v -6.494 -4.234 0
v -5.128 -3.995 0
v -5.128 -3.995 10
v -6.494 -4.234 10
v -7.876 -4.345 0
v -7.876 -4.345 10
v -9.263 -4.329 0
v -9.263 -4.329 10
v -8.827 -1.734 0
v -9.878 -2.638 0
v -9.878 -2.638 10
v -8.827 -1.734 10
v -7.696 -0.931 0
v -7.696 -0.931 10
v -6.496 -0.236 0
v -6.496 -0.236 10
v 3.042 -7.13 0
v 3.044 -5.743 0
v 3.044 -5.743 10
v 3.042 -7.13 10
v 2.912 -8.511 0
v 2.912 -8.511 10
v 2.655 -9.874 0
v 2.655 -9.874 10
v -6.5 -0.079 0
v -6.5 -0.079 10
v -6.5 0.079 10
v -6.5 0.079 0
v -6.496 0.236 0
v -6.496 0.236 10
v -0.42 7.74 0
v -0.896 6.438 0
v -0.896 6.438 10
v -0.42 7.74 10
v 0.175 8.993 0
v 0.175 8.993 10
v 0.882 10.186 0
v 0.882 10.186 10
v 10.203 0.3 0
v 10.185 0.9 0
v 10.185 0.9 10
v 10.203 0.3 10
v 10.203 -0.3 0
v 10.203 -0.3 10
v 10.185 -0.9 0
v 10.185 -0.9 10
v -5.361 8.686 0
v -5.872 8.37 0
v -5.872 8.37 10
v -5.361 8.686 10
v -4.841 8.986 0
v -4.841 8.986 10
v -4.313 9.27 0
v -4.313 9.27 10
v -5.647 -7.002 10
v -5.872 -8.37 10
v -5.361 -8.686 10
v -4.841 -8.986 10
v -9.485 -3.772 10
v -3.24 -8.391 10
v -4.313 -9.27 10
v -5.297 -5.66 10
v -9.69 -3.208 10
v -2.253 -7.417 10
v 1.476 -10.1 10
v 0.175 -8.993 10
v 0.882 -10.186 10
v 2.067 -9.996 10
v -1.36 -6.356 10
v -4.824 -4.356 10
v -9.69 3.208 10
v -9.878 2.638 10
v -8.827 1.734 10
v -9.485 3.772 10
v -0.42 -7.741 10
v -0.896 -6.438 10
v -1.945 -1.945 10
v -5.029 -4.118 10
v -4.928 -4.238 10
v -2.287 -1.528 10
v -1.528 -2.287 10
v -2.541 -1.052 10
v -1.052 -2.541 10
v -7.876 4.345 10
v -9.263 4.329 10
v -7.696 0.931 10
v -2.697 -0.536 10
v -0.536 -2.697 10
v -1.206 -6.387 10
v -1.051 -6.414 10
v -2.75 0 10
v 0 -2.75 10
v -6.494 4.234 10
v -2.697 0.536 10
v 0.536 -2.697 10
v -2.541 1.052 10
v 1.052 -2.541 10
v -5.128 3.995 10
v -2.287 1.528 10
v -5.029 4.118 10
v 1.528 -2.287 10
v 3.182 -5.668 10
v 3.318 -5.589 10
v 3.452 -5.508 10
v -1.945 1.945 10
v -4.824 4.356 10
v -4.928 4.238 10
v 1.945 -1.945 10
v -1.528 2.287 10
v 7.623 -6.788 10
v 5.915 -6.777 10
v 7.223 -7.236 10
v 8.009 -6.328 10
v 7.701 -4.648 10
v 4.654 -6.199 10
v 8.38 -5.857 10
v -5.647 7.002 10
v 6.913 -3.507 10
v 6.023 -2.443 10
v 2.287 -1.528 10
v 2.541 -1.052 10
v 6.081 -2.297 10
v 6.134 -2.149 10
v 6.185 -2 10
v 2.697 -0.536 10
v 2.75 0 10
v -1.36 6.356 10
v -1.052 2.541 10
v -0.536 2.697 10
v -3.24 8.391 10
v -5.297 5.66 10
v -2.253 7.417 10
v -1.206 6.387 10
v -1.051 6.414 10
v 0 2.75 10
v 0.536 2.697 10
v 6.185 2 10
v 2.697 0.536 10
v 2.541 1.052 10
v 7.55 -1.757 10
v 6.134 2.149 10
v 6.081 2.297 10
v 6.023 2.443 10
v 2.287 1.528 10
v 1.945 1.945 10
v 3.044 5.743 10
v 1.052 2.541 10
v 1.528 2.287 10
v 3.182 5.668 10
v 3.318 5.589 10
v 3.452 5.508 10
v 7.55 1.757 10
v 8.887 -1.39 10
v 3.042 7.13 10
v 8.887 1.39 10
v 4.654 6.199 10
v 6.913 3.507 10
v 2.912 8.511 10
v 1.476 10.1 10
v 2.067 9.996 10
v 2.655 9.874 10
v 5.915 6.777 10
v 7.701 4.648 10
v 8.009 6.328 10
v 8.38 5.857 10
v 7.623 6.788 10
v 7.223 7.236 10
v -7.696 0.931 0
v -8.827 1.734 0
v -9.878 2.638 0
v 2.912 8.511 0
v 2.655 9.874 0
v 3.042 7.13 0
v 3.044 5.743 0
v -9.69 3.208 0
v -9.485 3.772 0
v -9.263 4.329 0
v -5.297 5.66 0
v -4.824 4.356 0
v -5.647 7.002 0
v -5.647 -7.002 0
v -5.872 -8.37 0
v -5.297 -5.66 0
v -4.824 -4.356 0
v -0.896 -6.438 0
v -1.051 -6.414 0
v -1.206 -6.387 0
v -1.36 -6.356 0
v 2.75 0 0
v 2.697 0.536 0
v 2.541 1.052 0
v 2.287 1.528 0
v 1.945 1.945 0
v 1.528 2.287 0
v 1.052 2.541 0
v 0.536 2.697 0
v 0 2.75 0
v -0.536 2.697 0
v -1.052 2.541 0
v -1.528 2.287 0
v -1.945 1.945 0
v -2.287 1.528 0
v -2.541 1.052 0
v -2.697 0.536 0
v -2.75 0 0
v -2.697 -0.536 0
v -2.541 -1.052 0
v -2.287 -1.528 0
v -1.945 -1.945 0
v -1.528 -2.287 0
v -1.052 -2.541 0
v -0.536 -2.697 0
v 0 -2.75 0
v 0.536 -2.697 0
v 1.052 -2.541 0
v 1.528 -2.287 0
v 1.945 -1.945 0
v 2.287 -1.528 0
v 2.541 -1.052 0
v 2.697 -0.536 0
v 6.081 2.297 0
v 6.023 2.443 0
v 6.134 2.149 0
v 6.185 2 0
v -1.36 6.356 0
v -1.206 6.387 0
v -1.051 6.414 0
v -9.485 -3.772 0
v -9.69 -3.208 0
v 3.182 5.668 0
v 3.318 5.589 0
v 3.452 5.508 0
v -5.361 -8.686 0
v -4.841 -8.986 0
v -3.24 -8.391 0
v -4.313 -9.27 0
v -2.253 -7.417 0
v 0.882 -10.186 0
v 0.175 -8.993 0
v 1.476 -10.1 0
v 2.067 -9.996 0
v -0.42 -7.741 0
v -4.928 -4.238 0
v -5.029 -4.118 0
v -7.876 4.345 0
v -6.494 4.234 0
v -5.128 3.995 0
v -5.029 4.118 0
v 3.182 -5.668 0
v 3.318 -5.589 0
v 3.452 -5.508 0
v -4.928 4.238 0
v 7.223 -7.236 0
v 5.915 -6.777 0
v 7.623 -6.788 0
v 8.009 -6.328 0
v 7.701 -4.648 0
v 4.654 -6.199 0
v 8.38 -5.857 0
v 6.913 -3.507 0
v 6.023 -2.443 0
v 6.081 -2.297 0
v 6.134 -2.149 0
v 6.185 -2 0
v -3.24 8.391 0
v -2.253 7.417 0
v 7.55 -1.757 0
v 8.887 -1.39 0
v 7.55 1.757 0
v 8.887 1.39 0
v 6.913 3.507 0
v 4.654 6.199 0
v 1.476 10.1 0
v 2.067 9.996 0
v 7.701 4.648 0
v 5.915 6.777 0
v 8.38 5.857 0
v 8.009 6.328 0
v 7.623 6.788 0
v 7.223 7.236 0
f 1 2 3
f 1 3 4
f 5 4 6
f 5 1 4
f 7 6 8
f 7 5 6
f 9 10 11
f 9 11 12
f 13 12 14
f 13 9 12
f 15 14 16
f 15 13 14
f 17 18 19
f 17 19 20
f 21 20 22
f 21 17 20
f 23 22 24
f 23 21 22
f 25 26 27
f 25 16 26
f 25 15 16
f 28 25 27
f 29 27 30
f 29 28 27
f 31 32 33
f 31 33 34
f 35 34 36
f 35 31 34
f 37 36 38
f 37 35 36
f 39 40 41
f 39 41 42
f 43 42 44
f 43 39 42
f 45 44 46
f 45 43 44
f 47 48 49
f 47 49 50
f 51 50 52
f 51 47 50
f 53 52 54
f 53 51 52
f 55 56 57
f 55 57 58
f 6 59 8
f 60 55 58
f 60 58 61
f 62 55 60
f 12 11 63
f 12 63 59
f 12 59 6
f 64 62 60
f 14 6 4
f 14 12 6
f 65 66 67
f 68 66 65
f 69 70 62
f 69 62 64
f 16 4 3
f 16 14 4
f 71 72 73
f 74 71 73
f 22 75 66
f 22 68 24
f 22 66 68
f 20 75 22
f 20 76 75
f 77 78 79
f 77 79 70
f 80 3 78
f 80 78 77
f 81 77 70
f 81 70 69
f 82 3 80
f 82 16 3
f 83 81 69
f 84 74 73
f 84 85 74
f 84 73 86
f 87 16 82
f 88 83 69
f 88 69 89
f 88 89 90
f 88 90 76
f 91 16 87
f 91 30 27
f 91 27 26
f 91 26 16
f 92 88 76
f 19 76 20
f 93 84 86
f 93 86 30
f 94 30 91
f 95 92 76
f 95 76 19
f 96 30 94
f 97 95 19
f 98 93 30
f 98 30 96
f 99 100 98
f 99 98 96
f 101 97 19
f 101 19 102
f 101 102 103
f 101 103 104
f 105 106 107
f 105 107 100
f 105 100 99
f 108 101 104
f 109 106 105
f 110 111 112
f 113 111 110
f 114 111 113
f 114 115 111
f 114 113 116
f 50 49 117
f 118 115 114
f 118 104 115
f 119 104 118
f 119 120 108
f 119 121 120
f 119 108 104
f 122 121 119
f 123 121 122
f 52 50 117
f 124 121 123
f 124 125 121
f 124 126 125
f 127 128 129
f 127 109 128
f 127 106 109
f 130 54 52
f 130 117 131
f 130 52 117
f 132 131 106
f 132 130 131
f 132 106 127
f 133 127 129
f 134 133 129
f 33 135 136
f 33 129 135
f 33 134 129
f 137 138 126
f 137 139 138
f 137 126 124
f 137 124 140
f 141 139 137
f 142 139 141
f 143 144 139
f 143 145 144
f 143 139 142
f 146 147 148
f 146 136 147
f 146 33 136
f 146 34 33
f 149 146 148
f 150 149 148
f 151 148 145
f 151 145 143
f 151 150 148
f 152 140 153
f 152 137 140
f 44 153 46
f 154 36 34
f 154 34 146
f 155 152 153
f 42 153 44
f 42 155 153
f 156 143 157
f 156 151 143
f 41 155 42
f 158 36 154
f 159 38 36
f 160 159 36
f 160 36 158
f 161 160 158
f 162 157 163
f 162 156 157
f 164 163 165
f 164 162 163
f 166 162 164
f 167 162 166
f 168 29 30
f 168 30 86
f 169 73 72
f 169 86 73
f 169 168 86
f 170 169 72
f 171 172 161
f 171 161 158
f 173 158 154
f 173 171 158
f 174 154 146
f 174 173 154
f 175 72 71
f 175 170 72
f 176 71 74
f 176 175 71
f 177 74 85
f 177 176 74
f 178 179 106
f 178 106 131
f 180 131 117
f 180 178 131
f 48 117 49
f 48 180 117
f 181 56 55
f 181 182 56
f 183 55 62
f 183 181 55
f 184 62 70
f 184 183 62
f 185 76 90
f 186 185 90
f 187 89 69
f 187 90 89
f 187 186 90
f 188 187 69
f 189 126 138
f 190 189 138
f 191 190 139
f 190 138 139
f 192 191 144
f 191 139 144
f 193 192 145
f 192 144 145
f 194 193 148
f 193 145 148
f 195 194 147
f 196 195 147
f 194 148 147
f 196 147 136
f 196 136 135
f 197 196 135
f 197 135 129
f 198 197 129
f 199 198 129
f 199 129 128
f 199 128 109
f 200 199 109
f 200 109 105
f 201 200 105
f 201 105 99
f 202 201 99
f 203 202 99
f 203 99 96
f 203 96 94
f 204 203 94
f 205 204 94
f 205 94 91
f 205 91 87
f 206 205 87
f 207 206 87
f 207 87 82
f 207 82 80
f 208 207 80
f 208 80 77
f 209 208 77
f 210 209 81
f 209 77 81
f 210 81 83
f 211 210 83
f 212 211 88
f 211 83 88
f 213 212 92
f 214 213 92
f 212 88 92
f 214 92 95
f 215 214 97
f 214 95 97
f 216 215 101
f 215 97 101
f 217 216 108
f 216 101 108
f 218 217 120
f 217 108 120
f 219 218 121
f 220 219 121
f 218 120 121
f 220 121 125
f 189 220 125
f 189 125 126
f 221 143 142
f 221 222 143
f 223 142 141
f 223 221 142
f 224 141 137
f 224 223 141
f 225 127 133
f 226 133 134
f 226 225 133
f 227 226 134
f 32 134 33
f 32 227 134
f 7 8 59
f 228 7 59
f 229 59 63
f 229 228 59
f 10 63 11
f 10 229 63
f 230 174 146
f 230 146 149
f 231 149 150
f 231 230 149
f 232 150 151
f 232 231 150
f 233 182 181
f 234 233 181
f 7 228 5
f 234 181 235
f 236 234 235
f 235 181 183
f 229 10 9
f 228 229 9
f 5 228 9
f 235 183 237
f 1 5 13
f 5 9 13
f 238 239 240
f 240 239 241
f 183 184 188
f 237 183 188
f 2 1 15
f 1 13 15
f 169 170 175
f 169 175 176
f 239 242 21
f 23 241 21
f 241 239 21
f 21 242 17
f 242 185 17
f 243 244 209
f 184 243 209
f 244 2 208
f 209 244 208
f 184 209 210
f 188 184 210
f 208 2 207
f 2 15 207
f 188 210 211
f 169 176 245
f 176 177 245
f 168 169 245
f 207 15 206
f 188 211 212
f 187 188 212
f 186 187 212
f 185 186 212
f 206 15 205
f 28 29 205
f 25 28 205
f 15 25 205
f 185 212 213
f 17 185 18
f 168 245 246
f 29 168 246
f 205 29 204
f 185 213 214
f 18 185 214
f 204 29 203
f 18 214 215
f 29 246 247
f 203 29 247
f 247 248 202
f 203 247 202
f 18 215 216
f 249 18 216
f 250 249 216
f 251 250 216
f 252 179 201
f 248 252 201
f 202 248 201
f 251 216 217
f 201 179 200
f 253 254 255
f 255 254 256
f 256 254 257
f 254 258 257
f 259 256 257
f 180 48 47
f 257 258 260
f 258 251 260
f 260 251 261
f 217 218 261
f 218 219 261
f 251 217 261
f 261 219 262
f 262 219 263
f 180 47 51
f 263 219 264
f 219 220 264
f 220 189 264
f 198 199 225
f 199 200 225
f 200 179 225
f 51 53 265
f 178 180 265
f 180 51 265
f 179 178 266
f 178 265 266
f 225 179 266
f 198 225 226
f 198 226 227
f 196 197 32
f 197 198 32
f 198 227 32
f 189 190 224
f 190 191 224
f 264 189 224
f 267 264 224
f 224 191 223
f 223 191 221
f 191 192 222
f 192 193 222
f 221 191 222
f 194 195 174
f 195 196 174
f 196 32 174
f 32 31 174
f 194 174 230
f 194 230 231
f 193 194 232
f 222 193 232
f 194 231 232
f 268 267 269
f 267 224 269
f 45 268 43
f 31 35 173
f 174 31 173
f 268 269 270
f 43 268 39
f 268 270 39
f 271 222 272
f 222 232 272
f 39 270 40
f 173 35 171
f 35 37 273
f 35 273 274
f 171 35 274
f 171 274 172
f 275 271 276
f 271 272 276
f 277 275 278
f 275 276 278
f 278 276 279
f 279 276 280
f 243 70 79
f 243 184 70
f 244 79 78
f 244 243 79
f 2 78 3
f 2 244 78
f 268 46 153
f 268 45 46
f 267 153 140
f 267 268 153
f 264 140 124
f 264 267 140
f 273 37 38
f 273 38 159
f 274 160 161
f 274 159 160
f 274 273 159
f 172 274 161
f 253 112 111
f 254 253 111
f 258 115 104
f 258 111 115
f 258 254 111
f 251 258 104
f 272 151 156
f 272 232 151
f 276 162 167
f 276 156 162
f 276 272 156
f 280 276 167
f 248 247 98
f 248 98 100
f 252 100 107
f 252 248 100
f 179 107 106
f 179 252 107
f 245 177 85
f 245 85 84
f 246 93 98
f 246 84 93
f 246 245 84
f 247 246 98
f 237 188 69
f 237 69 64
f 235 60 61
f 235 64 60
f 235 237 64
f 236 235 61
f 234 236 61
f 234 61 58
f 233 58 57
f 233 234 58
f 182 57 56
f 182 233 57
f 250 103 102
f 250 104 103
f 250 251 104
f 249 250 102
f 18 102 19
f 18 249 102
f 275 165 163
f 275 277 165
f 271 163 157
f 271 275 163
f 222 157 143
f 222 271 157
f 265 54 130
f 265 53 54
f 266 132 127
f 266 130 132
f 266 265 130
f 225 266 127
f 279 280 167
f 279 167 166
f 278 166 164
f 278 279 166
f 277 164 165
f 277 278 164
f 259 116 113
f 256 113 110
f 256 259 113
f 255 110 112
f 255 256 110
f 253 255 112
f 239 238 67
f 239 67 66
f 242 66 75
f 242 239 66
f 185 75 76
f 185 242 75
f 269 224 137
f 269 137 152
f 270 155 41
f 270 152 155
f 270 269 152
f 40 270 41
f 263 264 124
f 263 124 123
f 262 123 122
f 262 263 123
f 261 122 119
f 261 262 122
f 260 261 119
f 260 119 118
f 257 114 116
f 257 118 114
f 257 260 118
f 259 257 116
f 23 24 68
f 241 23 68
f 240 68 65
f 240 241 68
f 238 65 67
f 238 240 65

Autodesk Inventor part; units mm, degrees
ref_plane "YZ Plane" through (0, 0, 0) normal (1, 0, 0) x (0, 1, 0)
ref_plane "XZ Plane" through (0, 0, 0) normal (0, 1, 0) x (-1, 0, 0)
ref_plane "XY Plane" through (0, 0, 0) normal (0, 0, 1) x (1, 0, 0)
sketch "Sketch1" plane through (0, 0, 0) normal (0, 0, 1) x (1, 0, 0)
  circle A0 centre (0, 0) radius 6.5
  line L0 (0, 0) -> (16, 0) construction
  arc A1 (10.1847, 0.9) -> (6.1847, 2) centre (4.2455, -12.8741) ccw
  arc A2 (6.1847, -2) -> (10.1847, -0.9) centre (4.2455, 12.8741) ccw
  arc A3 (6.1847, -2) -> (6.1847, 2) centre (0, 0) ccw
  arc A4 (10.1847, -0.9) -> (10.1847, 0.9) centre (-9.7951, 0) ccw
  arc A5 (7.2234, 7.236) -> (3.4521, 5.5075) centre (11.5276, -7.1332) ccw
  arc A6 (8.3804, 5.8571) -> (7.2234, 7.236) centre (-7.5035, -6.2962) ccw
  arc A7 (6.0233, 2.4433) -> (8.3804, 5.8571) centre (-5.0231, 12.5911) ccw
  arc A8 (6.0233, 2.4433) -> (3.4521, 5.5075) centre (0, 0) ccw
  arc A9 (0.8822, 10.1862) -> (-0.8957, 6.438) centre (13.4158, 1.9455) ccw
  arc A10 (2.6549, 9.8736) -> (0.8822, 10.1862) centre (-1.7009, -9.6463) ccw
  arc A11 (3.0436, 5.7434) -> (2.6549, 9.8736) centre (-11.9413, 6.4166) ccw
  arc A12 (3.0436, 5.7434) -> (-0.8957, 6.438) centre (0, 0) ccw
  arc A13 (-5.8718, 8.3702) -> (-4.8244, 4.3561) centre (9.0266, 10.1138) ccw
  arc A14 (-4.3129, 9.2702) -> (-5.8718, 8.3702) centre (4.8975, -8.4828) ccw
  arc A15 (-1.3603, 6.3561) -> (-4.3129, 9.2702) centre (-13.2721, -2.7603) ccw
  arc A16 (-1.3603, 6.3561) -> (-4.8244, 4.3561) centre (0, 0) ccw
  arc A17 (-9.8783, 2.6376) -> (-6.4957, 0.2359) centre (0.4137, 13.5498) ccw
  arc A18 (-9.2626, 4.3291) -> (-9.8783, 2.6376) centre (9.2044, -3.3501) ccw
  arc A19 (-5.1276, 3.9947) -> (-9.2626, 4.3291) centre (-8.3927, -10.6457) ccw
  arc A20 (-5.1276, 3.9947) -> (-6.4957, 0.2359) centre (0, 0) ccw
  arc A21 (-9.2626, -4.3291) -> (-5.1276, -3.9947) centre (-8.3927, 10.6457) ccw
  arc A22 (-9.8783, -2.6376) -> (-9.2626, -4.3291) centre (9.2044, 3.3501) ccw
  arc A23 (-6.4957, -0.2359) -> (-9.8783, -2.6376) centre (0.4137, -13.5498) ccw
  arc A24 (-6.4957, -0.2359) -> (-5.1276, -3.9947) centre (0, 0) ccw
  arc A25 (-4.3129, -9.2702) -> (-1.3603, -6.3561) centre (-13.2721, 2.7603) ccw
  arc A26 (-5.8718, -8.3702) -> (-4.3129, -9.2702) centre (4.8975, 8.4828) ccw
  arc A27 (-4.8244, -4.3561) -> (-5.8718, -8.3702) centre (9.0266, -10.1138) ccw
  arc A28 (-4.8244, -4.3561) -> (-1.3603, -6.3561) centre (0, 0) ccw
  arc A29 (2.6549, -9.8736) -> (3.0436, -5.7434) centre (-11.9413, -6.4166) ccw
  arc A30 (0.8822, -10.1862) -> (2.6549, -9.8736) centre (-1.7009, 9.6463) ccw
  arc A31 (-0.8957, -6.438) -> (0.8822, -10.1862) centre (13.4158, -1.9455) ccw
  arc A32 (-0.8957, -6.438) -> (3.0436, -5.7434) centre (0, 0) ccw
  arc A33 (8.3804, -5.8571) -> (6.0233, -2.4433) centre (-5.0231, -12.5911) ccw
  arc A34 (7.2234, -7.236) -> (8.3804, -5.8571) centre (-7.5035, 6.2962) ccw
  arc A35 (3.4521, -5.5075) -> (7.2234, -7.236) centre (11.5276, 7.1332) ccw
  arc A36 (3.4521, -5.5075) -> (6.0233, -2.4433) centre (0, 0) ccw
  point P0 (10.2049, 0)
  point P1 (7.8174, 6.5596)
  point P2 (1.7721, 10.0499)
  point P3 (-5.1025, 8.8377)
  point P4 (-9.5895, 3.4903)
  point P5 (-9.5895, -3.4903)
  point P6 (-5.1025, -8.8377)
  point P7 (1.7721, -10.0499)
  point P8 (7.8174, -6.5596)
  dimension "d0" = 13
  dimension "d1" = 16
  dimension "d2" = 15
  dimension "d3" = 4
  dimension "d4" = 2
  dimension "d6" = 1.8
  dimension "d15" = 20
  dimension "d18" = 360
extrude "Extrusion1" add sketch "Sketch1" along normal blind 10
sketch "Sketch5" plane through (0, 0, 10) normal (0, 0, 1) x (1, 0, 0)
  circle A0 centre (0, 0) radius 2.75
  dimension "d32" = 5.5
extrude "Extrusion5" cut sketch "Sketch5" against normal through all
properties part number "Motor Gear" material "ABS Plastic"
